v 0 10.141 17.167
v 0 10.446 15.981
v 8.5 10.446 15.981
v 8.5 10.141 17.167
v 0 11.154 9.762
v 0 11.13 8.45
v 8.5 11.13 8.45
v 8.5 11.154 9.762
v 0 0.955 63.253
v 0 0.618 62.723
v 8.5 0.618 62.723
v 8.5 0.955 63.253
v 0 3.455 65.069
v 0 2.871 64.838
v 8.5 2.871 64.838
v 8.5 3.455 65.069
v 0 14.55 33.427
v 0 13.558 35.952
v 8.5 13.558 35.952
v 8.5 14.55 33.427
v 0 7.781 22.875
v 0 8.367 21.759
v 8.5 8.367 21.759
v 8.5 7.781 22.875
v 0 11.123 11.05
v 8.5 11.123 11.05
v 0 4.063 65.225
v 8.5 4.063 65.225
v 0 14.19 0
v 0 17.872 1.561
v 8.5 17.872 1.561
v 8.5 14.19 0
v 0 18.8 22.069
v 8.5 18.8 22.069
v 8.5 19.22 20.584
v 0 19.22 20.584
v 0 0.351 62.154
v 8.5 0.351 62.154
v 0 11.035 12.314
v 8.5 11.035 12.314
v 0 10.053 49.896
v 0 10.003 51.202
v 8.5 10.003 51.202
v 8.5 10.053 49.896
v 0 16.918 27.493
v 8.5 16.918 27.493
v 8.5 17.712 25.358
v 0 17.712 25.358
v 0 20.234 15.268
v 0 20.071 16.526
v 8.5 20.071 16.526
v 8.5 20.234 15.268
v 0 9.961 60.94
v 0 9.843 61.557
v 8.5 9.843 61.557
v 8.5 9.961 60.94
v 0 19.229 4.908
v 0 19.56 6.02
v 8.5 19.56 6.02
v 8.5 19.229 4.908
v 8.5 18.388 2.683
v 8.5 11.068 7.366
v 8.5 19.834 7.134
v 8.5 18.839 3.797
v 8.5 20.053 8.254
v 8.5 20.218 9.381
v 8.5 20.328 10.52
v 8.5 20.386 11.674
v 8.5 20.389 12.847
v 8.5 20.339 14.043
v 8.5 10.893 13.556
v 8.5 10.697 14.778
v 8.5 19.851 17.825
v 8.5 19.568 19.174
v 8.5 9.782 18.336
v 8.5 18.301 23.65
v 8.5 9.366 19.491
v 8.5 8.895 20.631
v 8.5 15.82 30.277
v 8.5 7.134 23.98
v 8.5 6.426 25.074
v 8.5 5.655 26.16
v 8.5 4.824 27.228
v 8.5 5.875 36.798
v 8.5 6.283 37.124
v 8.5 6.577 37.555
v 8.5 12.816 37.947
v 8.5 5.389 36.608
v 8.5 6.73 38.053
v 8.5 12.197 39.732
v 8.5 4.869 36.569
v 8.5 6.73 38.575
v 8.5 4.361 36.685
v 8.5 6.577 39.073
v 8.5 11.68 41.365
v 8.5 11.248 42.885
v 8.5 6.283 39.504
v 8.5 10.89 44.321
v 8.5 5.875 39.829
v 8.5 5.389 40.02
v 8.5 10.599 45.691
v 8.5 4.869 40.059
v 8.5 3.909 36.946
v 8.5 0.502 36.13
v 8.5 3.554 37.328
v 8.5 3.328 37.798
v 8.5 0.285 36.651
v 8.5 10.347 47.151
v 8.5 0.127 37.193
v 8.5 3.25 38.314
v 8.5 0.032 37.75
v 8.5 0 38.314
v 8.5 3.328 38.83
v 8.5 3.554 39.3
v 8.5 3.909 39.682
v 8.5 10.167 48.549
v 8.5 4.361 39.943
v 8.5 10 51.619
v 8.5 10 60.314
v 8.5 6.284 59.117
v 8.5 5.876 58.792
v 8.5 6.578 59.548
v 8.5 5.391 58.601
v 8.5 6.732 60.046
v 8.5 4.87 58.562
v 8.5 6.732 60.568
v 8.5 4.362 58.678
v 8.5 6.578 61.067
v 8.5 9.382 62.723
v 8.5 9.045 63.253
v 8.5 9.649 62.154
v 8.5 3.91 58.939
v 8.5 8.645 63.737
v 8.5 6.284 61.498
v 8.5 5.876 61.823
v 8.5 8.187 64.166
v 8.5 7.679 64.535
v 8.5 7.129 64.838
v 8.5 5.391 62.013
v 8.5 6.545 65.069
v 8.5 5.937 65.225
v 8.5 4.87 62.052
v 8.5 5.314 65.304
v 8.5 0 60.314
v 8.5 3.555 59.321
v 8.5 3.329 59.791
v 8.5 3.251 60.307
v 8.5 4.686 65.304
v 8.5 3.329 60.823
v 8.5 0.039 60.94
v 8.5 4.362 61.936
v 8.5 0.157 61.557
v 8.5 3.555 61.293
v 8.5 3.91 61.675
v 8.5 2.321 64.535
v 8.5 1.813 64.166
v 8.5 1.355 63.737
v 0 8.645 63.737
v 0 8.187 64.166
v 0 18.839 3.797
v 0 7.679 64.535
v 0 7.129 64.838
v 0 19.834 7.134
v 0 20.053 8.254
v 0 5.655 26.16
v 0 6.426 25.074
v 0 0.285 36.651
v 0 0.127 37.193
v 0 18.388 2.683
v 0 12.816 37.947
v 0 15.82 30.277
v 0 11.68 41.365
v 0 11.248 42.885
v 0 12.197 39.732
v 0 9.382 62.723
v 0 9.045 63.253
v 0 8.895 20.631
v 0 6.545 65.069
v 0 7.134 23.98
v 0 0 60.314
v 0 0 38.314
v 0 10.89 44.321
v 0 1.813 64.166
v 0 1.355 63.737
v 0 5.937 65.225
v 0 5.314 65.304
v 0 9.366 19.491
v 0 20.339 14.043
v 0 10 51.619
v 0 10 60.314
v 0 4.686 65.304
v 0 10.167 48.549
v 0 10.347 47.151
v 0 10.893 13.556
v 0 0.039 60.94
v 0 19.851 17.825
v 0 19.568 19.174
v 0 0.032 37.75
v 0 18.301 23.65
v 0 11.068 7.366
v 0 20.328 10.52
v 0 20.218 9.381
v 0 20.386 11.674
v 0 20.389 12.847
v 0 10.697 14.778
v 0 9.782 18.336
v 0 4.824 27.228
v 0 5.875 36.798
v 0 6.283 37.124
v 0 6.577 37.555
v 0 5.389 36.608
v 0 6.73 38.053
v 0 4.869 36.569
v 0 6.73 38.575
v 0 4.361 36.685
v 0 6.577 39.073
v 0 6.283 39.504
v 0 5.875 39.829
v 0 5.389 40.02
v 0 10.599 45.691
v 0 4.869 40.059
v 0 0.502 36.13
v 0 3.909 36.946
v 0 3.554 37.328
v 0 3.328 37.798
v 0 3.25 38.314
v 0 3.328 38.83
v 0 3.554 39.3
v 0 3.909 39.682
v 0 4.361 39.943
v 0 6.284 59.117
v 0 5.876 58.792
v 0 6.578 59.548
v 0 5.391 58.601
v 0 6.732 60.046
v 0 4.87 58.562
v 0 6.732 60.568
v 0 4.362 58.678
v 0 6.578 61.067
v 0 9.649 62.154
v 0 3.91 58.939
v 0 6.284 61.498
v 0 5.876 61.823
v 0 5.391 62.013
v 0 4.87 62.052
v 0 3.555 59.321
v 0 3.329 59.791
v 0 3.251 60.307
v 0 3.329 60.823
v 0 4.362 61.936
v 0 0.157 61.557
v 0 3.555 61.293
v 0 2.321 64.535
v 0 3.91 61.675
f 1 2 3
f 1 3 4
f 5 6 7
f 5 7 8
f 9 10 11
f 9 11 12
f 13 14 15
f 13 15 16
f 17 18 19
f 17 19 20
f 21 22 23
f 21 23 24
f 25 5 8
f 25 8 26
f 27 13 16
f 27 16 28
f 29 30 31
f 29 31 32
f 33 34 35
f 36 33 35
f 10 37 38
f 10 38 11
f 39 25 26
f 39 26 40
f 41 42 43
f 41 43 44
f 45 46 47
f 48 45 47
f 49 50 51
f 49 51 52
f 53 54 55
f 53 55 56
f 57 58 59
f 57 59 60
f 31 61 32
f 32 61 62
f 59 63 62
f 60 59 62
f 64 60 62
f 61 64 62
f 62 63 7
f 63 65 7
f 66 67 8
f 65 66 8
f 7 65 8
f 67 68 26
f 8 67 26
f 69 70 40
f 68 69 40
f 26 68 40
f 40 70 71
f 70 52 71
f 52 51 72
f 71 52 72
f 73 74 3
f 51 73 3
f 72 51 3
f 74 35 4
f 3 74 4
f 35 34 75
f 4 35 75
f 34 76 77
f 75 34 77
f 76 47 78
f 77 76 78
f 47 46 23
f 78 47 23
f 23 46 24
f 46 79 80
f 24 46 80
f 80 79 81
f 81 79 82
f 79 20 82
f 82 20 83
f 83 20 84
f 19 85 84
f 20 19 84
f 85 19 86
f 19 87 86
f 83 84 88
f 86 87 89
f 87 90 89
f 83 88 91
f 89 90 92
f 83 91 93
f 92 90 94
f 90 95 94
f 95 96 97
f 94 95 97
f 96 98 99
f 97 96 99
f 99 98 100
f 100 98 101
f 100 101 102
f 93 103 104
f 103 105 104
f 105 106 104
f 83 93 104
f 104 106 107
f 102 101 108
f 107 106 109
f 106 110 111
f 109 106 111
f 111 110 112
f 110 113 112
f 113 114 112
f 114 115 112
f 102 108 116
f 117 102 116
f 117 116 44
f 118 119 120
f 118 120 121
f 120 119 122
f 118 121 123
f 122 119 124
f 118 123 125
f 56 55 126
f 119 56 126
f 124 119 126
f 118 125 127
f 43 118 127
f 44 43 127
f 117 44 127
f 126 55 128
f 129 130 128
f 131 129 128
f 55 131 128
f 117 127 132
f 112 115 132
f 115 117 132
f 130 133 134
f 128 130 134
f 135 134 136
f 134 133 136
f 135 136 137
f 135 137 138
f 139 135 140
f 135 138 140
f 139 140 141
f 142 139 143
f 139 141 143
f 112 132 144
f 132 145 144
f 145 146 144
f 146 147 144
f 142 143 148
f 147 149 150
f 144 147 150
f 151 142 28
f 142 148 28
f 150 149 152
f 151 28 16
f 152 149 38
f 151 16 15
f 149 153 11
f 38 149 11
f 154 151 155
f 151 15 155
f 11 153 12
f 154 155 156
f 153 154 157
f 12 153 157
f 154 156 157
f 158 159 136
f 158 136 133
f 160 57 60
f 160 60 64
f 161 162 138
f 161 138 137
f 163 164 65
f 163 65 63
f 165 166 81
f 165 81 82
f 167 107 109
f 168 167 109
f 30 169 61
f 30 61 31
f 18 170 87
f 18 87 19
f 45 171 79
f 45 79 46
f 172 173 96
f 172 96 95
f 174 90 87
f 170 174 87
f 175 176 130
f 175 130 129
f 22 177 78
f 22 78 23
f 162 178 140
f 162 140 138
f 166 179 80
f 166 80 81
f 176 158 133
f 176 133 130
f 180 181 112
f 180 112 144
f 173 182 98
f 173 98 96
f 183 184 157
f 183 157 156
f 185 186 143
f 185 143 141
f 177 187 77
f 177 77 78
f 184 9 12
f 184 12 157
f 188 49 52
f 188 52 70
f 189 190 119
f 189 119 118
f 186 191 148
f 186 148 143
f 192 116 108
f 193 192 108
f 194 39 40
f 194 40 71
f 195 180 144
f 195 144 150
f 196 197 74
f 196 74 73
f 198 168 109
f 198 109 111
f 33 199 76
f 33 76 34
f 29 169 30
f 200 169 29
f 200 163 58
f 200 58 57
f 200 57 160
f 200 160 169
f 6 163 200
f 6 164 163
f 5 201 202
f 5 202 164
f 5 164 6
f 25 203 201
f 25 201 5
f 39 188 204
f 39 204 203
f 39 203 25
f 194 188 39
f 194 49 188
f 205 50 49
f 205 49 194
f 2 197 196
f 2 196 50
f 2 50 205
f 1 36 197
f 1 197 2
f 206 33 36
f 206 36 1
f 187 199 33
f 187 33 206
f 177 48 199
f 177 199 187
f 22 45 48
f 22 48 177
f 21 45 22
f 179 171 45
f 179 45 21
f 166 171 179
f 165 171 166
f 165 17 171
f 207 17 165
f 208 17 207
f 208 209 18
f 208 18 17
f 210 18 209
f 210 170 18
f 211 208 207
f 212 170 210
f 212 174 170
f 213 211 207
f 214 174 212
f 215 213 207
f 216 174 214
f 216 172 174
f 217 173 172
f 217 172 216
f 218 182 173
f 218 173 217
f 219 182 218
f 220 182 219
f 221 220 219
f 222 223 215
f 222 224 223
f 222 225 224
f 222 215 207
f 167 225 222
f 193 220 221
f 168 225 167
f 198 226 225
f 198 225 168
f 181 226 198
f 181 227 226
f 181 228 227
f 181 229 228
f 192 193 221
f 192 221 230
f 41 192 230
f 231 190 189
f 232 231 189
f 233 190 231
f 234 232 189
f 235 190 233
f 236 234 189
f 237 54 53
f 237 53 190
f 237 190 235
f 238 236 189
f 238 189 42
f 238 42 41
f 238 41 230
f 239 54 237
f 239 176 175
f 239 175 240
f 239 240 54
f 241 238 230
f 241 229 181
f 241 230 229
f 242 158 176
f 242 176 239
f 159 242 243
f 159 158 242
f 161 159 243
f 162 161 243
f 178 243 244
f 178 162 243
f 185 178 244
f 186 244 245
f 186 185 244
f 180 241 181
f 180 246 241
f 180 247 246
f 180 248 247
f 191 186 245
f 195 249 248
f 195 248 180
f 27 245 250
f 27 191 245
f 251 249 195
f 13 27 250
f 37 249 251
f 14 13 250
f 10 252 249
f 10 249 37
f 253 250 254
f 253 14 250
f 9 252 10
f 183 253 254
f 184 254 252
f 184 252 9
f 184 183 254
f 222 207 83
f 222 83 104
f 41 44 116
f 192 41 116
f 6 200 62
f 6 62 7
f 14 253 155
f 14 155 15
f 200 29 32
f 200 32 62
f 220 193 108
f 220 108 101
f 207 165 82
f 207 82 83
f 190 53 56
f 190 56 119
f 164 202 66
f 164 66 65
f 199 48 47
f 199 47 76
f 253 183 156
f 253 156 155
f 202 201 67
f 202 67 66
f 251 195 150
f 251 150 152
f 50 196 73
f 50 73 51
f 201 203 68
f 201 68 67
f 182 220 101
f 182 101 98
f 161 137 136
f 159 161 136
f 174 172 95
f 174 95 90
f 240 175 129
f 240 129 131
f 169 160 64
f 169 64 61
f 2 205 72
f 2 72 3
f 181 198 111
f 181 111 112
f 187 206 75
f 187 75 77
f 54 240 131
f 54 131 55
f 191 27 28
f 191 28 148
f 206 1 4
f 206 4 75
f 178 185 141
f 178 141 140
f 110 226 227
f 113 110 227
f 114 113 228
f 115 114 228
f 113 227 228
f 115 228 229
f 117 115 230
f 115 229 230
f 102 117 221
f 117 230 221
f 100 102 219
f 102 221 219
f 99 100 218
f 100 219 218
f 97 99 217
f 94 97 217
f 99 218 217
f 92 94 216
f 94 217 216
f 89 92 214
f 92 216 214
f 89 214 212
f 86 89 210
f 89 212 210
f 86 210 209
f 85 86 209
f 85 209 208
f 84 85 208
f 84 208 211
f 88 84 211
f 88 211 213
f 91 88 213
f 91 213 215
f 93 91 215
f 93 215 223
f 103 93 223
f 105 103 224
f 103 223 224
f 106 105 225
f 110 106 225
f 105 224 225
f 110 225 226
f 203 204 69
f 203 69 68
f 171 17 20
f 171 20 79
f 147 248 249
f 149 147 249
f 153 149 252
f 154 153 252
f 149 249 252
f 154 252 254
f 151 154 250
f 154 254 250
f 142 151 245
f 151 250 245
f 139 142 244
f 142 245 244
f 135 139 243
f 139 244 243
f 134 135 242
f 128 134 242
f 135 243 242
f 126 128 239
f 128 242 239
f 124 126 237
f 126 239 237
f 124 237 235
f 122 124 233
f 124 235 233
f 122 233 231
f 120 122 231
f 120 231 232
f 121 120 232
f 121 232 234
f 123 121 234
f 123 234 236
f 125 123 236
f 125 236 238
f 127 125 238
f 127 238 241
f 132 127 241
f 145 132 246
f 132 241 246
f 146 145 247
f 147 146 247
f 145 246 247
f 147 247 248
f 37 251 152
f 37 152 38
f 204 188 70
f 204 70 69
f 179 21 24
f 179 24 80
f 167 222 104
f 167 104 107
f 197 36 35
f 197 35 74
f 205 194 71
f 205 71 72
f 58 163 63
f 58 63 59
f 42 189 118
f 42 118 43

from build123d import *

# Parameters (mm, degrees)
SKETCH1_R           = 1.749997696
SKETCH1_R_2         = 1.749993894
BOSS_EXTRUDE1_DEPTH = 8.500000462


with BuildPart() as part:
    # Sketch1 → Boss-Extrude1 (new body)
    with BuildSketch(Plane(origin=(0, 0, 0), x_dir=(0, -1, 0), z_dir=(-1, 0, 0))):
        Polygon((-0.127148596, 37.193398923), (-0.031888841, 37.750009447), (0, 38.313798606), (0, 60.313809663), (-0.03942649, 60.940481722), (-0.1570842, 61.557259411), (-0.351117604, 62.154430896), (-0.618466584, 62.722578645), (-0.954915013, 63.252732158), (-1.355157001, 63.736543059), (-1.812880044, 64.166367054), (-2.3208661, 64.535446465), (-2.87110405, 64.837940037), (-3.454915015, 65.06908685), (-4.063094035, 65.225243568), (-4.686047789, 65.303951502), (-5.313951988, 65.303951502), (-5.936907139, 65.225243568), (-6.545084994, 65.06908685), (-7.128897123, 64.837940037), (-7.679134142, 64.535446465), (-8.187118918, 64.166367054), (-8.644842543, 63.736543059), (-9.045084938, 63.252732158), (-9.3815336, 62.722578645), (-9.648882784, 62.154430896), (-9.842916392, 61.557259411), (-9.960573167, 60.940481722), (-9.999999776, 60.313809663), (-9.999999776, 51.61882937), (-10.003159754, 51.202278584), (-10.053309612, 49.896221608), (-10.166640393, 48.549070954), (-10.346939787, 47.150671482), (-10.599040426, 45.690581203), (-10.890450329, 44.321350753), (-11.248489842, 42.885411531), (-11.680469848, 41.3646698), (-12.197230011, 39.732418954), (-12.815520167, 37.947189063), (-13.558279723, 35.951770842), (-14.55048006, 33.42717886), (-15.819819644, 30.277069658), (-16.917720437, 27.492690831), (-17.711920664, 25.357909501), (-18.301250413, 23.649940267), (-18.799910322, 22.069010884), (-19.219560549, 20.58403939), (-19.567960873, 19.174400717), (-19.850589335, 17.825430259), (-20.071450621, 16.526099294), (-20.233500749, 15.267790295), (-20.338920876, 14.043499716), (-20.389260724, 12.84740027), (-20.385539159, 11.674479581), (-20.328279585, 10.52037999), (-20.217610523, 9.381227195), (-20.053209737, 8.253508247), (-19.83438991, 7.134027779), (-19.560100511, 6.019853055), (-19.228890538, 4.908256233), (-18.838969991, 3.796692938), (-18.388209864, 2.682805061), (-17.872419208, 1.56083703), (-14.189518528, -5.9e-07), (-11.067840271, 7.365807891), (-11.129870079, 8.45041126), (-11.15438994, 9.76248458), (-11.122629978, 11.049759574), (-11.035439558, 12.313780375), (-10.893439874, 13.556060381), (-10.697020218, 14.778049663), (-10.446329601, 15.981180593), (-10.141259991, 17.16681011), (-9.781503119, 18.3362104), (-9.366483428, 19.490620121), (-8.89539998, 20.6311699), (-8.367221802, 21.758910269), (-7.780684158, 22.874809802), (-7.134305779, 23.979740217), (-6.42638607, 25.074450299), (-5.655040033, 26.159580797), (-4.82408423, 27.228390798), (-0.502127572, 36.129970104), (-0.284564187, 36.651078612), align=None)
        with Locations((-5.001175624, 60.307227597)):
            Circle(SKETCH1_R, mode=Mode.SUBTRACT)
        with Locations((-5.000006282, 38.313804534)):
            Circle(SKETCH1_R_2, mode=Mode.SUBTRACT)
    extrude(amount=-BOSS_EXTRUDE1_DEPTH)


solid = part.part
